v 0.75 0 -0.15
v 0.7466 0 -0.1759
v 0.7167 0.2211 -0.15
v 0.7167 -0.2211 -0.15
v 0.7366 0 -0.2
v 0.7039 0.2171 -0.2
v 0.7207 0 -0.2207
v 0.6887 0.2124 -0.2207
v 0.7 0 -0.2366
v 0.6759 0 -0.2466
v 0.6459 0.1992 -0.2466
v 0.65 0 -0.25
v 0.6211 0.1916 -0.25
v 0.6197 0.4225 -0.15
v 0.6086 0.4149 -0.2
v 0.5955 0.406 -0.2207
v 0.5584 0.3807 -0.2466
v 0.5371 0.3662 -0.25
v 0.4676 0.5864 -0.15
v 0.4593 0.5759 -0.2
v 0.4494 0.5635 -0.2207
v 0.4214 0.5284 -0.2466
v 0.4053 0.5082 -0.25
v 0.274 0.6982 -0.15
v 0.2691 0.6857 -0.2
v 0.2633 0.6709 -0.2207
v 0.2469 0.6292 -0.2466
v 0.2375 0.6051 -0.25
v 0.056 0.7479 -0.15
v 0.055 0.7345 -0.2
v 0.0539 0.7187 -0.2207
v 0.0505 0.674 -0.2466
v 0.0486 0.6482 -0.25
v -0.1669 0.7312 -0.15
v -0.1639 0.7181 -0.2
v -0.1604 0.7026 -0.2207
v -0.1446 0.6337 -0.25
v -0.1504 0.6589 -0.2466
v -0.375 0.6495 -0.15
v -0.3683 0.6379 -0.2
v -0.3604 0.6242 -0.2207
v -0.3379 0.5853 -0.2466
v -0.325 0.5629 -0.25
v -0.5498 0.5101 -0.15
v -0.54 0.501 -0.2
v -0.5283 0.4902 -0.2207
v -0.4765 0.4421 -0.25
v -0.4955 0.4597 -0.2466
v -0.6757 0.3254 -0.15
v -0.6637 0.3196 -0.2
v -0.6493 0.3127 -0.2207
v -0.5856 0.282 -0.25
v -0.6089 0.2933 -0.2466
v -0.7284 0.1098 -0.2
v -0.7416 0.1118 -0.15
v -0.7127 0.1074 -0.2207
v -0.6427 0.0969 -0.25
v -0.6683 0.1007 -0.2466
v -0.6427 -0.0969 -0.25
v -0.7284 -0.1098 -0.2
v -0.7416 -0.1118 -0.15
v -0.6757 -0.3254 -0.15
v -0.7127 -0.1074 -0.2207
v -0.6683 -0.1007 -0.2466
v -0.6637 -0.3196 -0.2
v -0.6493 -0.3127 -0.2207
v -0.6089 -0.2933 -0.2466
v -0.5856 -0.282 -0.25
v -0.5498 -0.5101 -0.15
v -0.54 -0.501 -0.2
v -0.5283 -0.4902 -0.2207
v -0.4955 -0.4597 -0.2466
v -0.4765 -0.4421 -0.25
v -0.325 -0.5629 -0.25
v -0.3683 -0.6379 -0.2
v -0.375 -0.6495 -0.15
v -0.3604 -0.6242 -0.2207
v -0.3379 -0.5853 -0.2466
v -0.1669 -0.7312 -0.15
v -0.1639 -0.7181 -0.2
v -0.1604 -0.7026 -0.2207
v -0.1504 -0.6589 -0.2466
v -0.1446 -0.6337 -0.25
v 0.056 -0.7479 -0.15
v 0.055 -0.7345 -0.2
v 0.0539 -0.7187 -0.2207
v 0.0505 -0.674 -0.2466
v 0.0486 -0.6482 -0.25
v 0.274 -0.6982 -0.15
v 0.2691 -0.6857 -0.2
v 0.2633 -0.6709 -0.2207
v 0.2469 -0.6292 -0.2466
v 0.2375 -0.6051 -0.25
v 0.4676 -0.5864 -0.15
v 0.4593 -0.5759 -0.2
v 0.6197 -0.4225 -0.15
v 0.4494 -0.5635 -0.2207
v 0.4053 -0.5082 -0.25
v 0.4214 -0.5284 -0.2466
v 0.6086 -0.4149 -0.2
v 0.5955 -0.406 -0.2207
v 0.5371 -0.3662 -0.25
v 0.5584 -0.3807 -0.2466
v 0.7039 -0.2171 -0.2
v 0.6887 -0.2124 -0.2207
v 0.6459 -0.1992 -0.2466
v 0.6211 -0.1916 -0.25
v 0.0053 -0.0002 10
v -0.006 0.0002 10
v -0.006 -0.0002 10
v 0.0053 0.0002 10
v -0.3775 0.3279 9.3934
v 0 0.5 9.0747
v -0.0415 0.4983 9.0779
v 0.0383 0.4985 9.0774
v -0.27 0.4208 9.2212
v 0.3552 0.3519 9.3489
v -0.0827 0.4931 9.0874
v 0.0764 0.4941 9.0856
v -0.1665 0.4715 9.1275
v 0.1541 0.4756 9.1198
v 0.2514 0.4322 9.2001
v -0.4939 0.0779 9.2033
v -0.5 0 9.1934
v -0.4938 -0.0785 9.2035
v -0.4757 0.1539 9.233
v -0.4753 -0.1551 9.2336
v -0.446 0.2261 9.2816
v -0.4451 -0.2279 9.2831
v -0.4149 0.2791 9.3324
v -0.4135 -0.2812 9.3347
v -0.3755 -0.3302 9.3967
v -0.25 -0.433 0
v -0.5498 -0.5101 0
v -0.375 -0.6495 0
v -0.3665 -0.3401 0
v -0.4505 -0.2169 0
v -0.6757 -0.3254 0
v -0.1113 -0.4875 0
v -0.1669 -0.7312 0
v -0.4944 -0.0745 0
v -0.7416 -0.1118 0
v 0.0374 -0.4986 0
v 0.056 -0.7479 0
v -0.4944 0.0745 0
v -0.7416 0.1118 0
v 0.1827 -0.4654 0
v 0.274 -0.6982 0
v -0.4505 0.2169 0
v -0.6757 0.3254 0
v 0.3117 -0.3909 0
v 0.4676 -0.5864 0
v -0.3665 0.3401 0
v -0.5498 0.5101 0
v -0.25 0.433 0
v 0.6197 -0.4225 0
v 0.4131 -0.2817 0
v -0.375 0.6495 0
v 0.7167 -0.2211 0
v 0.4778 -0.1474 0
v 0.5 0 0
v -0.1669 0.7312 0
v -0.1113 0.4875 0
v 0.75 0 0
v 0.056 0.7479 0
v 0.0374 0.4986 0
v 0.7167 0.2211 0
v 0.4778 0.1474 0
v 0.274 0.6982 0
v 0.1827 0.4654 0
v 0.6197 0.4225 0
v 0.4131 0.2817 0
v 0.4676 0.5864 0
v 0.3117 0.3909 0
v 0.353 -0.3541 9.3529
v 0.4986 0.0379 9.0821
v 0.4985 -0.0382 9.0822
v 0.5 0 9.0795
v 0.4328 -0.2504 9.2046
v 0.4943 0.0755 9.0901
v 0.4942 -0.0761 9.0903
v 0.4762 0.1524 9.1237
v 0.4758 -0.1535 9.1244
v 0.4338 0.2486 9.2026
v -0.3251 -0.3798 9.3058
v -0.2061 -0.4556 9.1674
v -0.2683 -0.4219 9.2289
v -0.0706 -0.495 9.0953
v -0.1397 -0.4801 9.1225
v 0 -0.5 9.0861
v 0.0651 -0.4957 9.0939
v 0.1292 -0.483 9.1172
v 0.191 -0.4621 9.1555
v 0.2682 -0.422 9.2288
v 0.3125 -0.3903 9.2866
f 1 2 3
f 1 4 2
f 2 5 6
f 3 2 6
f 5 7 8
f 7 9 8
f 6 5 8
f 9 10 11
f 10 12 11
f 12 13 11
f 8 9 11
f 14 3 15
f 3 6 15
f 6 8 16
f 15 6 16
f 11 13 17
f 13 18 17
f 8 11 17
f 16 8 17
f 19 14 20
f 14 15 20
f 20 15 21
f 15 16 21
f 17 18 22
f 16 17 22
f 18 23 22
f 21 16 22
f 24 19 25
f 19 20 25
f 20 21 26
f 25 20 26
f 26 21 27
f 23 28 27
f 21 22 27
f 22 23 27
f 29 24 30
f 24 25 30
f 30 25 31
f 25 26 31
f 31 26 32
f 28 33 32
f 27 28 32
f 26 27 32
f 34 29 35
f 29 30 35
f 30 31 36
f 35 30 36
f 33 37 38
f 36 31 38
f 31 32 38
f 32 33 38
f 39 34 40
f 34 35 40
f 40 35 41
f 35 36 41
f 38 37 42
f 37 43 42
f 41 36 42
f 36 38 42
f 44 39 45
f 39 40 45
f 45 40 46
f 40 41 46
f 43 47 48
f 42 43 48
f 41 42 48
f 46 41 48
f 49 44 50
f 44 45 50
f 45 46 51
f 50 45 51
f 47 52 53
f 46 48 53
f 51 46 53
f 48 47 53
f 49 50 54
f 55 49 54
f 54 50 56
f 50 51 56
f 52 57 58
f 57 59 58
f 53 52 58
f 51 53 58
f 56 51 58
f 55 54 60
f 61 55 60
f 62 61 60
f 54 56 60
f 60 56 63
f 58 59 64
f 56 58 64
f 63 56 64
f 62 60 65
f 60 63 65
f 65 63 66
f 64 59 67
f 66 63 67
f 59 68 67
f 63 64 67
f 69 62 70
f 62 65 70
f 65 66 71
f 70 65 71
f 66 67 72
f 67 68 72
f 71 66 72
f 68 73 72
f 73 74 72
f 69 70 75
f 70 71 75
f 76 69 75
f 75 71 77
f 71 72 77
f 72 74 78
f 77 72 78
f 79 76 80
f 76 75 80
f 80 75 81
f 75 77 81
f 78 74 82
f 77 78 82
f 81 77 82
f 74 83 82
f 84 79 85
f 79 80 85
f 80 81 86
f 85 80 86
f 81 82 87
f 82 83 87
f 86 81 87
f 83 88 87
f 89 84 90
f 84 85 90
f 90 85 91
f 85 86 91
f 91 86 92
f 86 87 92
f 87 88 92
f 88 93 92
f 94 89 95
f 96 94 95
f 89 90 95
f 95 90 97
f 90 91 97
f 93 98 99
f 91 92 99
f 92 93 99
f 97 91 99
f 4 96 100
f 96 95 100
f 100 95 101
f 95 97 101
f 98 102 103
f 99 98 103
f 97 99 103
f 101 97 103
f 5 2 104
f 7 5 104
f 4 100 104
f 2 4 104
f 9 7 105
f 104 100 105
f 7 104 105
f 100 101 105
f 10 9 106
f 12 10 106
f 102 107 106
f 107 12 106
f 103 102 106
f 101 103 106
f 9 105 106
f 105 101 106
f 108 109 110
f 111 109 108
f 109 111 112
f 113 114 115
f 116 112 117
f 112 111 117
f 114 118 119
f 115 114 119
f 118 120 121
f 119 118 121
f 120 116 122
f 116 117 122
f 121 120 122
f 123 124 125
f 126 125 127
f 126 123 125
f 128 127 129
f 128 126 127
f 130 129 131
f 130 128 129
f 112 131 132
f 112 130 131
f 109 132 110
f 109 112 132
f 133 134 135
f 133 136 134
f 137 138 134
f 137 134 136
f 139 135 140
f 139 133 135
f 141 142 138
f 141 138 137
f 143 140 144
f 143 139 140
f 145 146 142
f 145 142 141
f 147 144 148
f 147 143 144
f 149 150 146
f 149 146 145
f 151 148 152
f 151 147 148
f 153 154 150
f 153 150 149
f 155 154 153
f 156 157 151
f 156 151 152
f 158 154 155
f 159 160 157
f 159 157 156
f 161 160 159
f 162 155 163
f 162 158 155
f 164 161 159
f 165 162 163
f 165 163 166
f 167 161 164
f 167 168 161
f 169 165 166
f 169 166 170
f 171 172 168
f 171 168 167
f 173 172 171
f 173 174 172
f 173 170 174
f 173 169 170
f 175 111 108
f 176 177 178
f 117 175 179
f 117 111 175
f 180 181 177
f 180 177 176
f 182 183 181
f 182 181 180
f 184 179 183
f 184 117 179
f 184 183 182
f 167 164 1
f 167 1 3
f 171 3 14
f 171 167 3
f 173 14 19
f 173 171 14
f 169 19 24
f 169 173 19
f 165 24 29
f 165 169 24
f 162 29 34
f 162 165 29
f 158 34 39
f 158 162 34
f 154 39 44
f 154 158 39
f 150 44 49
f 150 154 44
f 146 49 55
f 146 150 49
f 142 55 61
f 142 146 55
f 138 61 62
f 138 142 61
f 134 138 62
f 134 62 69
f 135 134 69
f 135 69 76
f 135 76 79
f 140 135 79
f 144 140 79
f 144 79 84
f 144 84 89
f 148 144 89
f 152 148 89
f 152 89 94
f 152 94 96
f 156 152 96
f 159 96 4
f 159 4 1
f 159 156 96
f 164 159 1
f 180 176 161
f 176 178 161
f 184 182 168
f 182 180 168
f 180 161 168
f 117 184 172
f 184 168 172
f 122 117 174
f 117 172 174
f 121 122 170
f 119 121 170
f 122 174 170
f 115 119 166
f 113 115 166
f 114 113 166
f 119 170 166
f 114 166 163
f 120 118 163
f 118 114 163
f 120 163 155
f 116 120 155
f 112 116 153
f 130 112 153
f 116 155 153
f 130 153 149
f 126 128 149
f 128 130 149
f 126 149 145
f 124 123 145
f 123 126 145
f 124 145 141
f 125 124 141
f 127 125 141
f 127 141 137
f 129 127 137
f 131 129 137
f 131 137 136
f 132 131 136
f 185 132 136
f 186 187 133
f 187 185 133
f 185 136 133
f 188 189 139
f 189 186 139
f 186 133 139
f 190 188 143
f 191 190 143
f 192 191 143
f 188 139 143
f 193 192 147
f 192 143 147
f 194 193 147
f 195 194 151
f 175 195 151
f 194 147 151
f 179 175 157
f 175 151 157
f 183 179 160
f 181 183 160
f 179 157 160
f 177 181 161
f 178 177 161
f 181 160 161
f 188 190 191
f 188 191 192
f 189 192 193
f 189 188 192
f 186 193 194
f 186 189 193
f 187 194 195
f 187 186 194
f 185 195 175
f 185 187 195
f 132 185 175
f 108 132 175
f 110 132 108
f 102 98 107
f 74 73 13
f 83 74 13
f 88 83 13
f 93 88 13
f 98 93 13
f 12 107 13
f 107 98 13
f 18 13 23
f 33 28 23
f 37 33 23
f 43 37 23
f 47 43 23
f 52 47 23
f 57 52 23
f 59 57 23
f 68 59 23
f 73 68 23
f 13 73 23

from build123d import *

# Parameters (mm, degrees)
F0_R          = 0.5
F1_DEPTH      = 10
F0_R_2        = 0.75
F2_DEPTH      = 0.25
F3_R          = 0.1
F5_DEPTH      = 25
F5_DEPTH_BACK = 25
F7_DEPTH      = 25
F7_DEPTH_BACK = 25


with BuildPart() as f1:
    # F0 (on Top) → F1 (new body)
    with BuildSketch(Plane.XY):
        Circle(F0_R)
    extrude(amount=F1_DEPTH)

    # F0 (on Top) → F2 (join)
    with BuildSketch(Plane.XY):
        Circle(F0_R_2)
        Circle(F0_R, mode=Mode.SUBTRACT)
        Circle(F0_R)
    extrude(amount=-F2_DEPTH)

    # F3
    f3_edges = [f1.edges().sort_by_distance(p)[0] for p in [
        (-0.75, 0, -0.25),
    ]]
    fillet(f3_edges, radius=F3_R)

    # F4 (on Right) → F5 (cut, two sides)
    with BuildSketch(Plane.YZ) as f5_sk:
        Polygon((-0.677386, 8.761818), (0, 10.000281), (0.69153, 8.720125), (0.69153, 10.707485), (-0.809413, 10.707485), align=None)
    extrude(amount=F5_DEPTH, mode=Mode.SUBTRACT)
    extrude(f5_sk.sketch, amount=-F5_DEPTH_BACK, mode=Mode.SUBTRACT)

    # F6 (on Front) → F7 (cut, two sides)
    with BuildSketch(Plane.XZ) as f7_sk:
        Polygon((-0.791911, 8.716712), (0, 10.009787), (0.678298, 8.74771), (0.678298, 10.293201), (-0.791911, 10.293201), align=None)
    extrude(amount=F7_DEPTH, mode=Mode.SUBTRACT)
    extrude(f7_sk.sketch, amount=-F7_DEPTH_BACK, mode=Mode.SUBTRACT)


solid = f1.part
